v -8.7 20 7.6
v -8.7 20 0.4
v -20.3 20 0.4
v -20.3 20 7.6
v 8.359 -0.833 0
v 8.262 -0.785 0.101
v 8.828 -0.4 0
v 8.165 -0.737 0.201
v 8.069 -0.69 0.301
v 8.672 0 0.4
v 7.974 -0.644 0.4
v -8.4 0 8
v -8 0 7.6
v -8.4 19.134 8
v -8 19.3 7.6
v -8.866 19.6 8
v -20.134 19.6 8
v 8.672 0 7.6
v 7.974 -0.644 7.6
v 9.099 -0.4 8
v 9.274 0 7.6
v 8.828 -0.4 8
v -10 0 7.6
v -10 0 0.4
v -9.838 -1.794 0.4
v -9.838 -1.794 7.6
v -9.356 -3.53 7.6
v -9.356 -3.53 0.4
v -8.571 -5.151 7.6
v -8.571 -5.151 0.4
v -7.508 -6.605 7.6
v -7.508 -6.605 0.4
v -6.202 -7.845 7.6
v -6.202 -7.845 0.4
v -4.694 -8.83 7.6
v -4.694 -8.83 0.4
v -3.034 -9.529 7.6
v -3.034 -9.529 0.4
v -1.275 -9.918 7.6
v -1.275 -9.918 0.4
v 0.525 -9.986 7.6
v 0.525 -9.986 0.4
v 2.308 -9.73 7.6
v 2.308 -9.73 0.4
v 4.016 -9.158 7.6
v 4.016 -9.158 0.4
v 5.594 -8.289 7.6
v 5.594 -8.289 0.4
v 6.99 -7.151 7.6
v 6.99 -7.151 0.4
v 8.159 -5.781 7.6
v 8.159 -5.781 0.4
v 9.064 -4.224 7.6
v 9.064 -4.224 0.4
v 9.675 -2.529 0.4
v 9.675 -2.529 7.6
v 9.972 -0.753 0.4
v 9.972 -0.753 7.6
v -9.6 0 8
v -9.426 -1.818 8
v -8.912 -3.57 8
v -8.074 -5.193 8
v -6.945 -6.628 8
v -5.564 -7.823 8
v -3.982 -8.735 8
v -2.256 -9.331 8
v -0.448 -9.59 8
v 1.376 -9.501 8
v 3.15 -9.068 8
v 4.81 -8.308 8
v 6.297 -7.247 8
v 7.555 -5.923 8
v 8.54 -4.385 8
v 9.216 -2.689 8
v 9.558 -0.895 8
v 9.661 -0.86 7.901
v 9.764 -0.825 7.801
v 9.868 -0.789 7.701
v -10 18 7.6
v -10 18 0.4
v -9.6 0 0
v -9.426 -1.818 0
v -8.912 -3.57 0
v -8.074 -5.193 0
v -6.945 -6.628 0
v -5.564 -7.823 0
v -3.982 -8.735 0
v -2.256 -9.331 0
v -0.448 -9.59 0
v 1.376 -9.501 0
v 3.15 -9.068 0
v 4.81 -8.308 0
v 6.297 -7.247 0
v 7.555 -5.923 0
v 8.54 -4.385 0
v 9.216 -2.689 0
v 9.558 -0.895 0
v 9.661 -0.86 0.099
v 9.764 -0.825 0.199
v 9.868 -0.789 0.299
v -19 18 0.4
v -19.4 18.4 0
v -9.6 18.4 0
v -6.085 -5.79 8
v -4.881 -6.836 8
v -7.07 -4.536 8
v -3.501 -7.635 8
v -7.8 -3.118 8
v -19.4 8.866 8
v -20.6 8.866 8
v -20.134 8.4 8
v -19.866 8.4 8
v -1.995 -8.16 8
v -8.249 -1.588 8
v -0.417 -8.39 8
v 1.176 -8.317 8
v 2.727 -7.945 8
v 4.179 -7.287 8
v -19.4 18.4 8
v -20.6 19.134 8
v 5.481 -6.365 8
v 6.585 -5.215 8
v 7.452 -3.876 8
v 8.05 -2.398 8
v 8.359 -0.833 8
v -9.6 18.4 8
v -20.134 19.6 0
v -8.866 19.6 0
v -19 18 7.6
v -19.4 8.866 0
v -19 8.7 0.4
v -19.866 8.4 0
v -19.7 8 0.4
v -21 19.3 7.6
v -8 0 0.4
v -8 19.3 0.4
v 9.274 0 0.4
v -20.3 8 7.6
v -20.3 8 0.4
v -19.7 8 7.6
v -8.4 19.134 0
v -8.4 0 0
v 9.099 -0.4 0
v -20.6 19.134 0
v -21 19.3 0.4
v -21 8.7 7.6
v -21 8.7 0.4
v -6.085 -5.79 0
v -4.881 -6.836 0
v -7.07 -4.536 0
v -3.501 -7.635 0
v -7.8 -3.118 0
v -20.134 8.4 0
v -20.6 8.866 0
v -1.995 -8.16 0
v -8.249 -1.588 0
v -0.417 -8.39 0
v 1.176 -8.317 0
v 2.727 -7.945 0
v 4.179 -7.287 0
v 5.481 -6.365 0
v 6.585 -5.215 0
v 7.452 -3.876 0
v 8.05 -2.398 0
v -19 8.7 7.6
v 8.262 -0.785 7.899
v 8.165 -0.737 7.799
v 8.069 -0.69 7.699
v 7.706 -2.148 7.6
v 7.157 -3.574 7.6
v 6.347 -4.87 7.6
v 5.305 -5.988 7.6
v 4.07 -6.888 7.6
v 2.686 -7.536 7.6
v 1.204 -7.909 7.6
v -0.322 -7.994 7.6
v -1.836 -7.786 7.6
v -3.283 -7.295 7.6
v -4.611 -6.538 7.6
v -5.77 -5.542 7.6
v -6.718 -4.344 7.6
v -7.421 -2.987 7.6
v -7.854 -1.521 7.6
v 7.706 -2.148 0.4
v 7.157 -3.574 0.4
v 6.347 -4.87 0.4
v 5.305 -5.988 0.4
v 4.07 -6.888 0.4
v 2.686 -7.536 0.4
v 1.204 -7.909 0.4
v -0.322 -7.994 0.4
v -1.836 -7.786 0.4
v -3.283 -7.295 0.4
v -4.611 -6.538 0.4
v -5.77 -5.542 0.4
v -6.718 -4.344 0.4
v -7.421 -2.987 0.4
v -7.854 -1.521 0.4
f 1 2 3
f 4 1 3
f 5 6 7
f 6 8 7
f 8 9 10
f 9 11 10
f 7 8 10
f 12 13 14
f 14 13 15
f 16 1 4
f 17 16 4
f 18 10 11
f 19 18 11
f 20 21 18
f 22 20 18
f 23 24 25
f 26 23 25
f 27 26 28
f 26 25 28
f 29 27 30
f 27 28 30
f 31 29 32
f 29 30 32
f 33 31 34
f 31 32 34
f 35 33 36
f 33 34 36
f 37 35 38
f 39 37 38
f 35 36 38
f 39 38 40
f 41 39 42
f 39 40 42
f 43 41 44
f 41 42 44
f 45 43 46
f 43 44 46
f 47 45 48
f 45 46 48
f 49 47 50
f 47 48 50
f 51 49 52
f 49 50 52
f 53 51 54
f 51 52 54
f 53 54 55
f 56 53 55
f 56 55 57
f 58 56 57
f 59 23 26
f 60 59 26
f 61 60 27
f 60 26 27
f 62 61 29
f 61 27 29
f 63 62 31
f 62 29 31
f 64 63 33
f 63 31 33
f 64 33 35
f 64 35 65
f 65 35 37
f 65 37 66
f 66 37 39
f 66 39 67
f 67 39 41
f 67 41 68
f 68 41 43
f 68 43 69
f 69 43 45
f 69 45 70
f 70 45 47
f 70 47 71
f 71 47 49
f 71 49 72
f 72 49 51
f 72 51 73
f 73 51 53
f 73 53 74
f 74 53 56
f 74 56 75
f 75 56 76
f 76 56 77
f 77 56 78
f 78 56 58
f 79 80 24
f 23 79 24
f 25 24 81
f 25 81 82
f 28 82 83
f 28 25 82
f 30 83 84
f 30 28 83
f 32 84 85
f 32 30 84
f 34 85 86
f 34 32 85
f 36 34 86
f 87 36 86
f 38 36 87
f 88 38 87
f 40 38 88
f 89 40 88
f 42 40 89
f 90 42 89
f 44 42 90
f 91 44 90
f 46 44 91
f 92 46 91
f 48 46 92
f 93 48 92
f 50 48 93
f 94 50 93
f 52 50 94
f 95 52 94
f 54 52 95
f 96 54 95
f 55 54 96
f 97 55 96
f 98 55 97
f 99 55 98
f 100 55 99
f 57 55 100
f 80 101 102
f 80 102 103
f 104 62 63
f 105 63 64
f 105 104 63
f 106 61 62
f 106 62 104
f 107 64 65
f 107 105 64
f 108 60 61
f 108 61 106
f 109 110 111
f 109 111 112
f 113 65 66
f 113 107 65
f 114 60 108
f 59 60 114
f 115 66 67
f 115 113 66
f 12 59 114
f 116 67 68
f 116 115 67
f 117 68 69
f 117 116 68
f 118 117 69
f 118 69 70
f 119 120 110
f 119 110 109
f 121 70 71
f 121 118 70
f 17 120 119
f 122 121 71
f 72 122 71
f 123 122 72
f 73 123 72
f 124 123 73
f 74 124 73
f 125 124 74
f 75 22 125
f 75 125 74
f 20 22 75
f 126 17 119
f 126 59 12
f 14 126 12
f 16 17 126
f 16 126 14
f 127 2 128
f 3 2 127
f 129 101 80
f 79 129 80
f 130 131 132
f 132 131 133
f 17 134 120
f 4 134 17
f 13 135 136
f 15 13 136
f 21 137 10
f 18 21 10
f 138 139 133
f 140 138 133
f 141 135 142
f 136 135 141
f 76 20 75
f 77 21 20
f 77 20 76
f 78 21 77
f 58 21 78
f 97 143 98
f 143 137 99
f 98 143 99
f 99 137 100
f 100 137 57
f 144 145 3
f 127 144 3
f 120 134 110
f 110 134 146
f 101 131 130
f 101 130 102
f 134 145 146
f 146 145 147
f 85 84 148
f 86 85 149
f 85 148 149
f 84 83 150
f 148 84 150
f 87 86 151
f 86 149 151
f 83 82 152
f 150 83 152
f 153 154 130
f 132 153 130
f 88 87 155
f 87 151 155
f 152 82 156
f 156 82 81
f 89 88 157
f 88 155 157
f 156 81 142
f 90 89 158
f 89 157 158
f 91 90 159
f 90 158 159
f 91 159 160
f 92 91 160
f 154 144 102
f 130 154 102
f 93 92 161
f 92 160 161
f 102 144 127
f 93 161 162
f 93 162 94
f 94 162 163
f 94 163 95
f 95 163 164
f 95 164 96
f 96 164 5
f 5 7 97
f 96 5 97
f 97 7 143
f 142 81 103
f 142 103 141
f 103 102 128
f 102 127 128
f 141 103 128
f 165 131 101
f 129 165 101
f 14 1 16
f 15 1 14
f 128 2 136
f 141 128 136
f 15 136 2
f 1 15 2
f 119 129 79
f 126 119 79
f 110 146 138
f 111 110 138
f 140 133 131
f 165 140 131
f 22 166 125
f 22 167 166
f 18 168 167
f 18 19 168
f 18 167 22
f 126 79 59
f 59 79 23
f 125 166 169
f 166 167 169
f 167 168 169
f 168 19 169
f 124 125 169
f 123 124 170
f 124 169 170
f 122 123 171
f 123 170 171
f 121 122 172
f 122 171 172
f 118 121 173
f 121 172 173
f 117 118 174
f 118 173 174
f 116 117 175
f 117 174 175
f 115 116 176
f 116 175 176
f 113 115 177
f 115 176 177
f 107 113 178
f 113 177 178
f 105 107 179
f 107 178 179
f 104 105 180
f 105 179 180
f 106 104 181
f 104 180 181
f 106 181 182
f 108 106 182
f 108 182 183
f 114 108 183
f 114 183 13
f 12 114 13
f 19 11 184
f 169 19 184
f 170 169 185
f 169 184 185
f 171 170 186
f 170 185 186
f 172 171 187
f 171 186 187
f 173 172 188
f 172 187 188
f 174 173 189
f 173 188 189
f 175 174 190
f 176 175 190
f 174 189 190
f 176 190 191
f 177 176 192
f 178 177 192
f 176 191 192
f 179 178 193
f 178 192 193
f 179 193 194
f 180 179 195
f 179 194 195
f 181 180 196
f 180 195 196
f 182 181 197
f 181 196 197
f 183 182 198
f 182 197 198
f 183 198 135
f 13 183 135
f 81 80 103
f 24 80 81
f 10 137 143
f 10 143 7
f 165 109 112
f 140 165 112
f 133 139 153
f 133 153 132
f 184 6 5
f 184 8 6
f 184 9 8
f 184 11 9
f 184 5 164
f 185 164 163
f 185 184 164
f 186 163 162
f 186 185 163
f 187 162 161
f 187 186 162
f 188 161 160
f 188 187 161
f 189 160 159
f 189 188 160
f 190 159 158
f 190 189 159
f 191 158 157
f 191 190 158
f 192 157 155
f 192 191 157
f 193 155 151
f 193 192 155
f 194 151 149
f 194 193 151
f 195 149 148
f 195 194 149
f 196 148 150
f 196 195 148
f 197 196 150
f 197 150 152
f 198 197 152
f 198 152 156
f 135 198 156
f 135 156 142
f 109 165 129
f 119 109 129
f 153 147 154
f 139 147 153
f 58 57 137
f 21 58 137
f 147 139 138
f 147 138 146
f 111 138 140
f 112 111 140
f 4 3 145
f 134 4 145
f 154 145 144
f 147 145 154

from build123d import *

# Parameters (mm, degrees)
F1_DEPTH    = 8
F2_T1_DEPTH = 11.6003561832
F2_T3_DEPTH = 11.8663751546
F2_T5_DEPTH = 11.4631685347
F3_SIZE     = 0.4


# Not quite as in the source:
# - a fillet or chamfer that OpenCascade refuses, or shapes differently, is made with other operations: its cross-section is extruded or revolved along the edge and cut away or added


with BuildPart() as f1:
    # F0 (on Top) → F1 (new body)
    with BuildSketch(Plane.XY):
        with BuildLine():
            Line((-21, 8), (-19, 8))
            Line((-19, 8), (-19, 18))
            Line((-19, 18), (-10, 18))
            Line((-10, 18), (-10, 0))
            ThreePointArc((-10, 0), (0, -10), (10, 0))
            Line((10, 0), (8, 0))
            ThreePointArc((8, 0), (0, -8), (-8, 0))
            Line((-8, 0), (-8, 20))
            Line((-8, 20), (-21, 20))
            Line((-21, 20), (-21, 8))
        make_face()
    extrude(amount=F1_DEPTH)

    # F2: chamfer of 0.7 on 6 edges, made by hand

    # F2_s2 → F2_t1 (cut)
    with BuildSketch(Plane.XY.offset(-1.8001780916)):
        Polygon((-8, 19.3), (-8.7, 20), (-8, 20), align=None)
        Polygon((-20.3, 20), (-21, 19.3), (-21, 20), align=None)
        Polygon((-20.3, 8), (-21, 8.7), (-21, 8), align=None)
        Polygon((-19.7, 8), (-19, 8.7), (-19, 8), align=None)
    extrude(amount=F2_T1_DEPTH, mode=Mode.SUBTRACT)

    # F2_s4 → F2_t3 (cut)
    with BuildSketch(Plane.XY.offset(-1.9331875773)):
        with BuildLine():
            Line((9.9716327909, -0.752688172), (9.2736184955, 0))
            Line((9.2736184955, 0), (10, 0))
            ThreePointArc((10, 0), (9.9925280661, -0.3865007745), (9.9716327909, -0.752688172))
        make_face()
    extrude(amount=F2_T3_DEPTH, mode=Mode.SUBTRACT)

    # F2_s6 → F2_t5 (cut)
    with BuildSketch(Plane.XY.offset(-1.7315842673)):
        with BuildLine():
            Line((8.6717933555, 0), (7.9740628556, -0.6436781609))
            ThreePointArc((7.9740628556, -0.6436781609), (7.9931075422, -0.332011775), (8, 0))
            Line((8, 0), (8.6717933555, 0))
        make_face()
    extrude(amount=F2_T5_DEPTH, mode=Mode.SUBTRACT)

    # F3
    f3_edges = [f1.edges().sort_by_distance(p)[0] for p in [
        (-20.65, 19.65, 8),
        (-14.5, 20, 8),
        (-8.35, 19.65, 8),
        (-8, 9.65, 8),
        (-0.3221, -7.993513, 8),
        (8.322928, -0.321839, 8),
        (8.972706, 0, 8),
        (9.622626, -0.376344, 8),
        (-0.376611, -9.992906, 8),
        (-10, 9, 8),
        (-14.5, 18, 8),
        (-19, 13.35, 8),
        (-19.35, 8.35, 8),
        (-20, 8, 8),
        (-20.65, 8.35, 8),
        (-21, 14, 8),
        (-20.65, 19.65, 0),
        (-14.5, 20, 0),
        (-8.35, 19.65, 0),
        (-8, 9.65, 0),
        (-0.3221, -7.993513, 0),
        (8.322928, -0.321839, 0),
        (8.972706, 0, 0),
        (9.622626, -0.376344, 0),
        (-0.376611, -9.992906, 0),
        (-10, 9, 0),
        (-14.5, 18, 0),
        (-19, 13.35, 0),
        (-19.35, 8.35, 0),
        (-20, 8, 0),
        (-20.65, 8.35, 0),
        (-21, 14, 0),
    ]]
    chamfer(f3_edges, length=F3_SIZE)


solid = f1.part
